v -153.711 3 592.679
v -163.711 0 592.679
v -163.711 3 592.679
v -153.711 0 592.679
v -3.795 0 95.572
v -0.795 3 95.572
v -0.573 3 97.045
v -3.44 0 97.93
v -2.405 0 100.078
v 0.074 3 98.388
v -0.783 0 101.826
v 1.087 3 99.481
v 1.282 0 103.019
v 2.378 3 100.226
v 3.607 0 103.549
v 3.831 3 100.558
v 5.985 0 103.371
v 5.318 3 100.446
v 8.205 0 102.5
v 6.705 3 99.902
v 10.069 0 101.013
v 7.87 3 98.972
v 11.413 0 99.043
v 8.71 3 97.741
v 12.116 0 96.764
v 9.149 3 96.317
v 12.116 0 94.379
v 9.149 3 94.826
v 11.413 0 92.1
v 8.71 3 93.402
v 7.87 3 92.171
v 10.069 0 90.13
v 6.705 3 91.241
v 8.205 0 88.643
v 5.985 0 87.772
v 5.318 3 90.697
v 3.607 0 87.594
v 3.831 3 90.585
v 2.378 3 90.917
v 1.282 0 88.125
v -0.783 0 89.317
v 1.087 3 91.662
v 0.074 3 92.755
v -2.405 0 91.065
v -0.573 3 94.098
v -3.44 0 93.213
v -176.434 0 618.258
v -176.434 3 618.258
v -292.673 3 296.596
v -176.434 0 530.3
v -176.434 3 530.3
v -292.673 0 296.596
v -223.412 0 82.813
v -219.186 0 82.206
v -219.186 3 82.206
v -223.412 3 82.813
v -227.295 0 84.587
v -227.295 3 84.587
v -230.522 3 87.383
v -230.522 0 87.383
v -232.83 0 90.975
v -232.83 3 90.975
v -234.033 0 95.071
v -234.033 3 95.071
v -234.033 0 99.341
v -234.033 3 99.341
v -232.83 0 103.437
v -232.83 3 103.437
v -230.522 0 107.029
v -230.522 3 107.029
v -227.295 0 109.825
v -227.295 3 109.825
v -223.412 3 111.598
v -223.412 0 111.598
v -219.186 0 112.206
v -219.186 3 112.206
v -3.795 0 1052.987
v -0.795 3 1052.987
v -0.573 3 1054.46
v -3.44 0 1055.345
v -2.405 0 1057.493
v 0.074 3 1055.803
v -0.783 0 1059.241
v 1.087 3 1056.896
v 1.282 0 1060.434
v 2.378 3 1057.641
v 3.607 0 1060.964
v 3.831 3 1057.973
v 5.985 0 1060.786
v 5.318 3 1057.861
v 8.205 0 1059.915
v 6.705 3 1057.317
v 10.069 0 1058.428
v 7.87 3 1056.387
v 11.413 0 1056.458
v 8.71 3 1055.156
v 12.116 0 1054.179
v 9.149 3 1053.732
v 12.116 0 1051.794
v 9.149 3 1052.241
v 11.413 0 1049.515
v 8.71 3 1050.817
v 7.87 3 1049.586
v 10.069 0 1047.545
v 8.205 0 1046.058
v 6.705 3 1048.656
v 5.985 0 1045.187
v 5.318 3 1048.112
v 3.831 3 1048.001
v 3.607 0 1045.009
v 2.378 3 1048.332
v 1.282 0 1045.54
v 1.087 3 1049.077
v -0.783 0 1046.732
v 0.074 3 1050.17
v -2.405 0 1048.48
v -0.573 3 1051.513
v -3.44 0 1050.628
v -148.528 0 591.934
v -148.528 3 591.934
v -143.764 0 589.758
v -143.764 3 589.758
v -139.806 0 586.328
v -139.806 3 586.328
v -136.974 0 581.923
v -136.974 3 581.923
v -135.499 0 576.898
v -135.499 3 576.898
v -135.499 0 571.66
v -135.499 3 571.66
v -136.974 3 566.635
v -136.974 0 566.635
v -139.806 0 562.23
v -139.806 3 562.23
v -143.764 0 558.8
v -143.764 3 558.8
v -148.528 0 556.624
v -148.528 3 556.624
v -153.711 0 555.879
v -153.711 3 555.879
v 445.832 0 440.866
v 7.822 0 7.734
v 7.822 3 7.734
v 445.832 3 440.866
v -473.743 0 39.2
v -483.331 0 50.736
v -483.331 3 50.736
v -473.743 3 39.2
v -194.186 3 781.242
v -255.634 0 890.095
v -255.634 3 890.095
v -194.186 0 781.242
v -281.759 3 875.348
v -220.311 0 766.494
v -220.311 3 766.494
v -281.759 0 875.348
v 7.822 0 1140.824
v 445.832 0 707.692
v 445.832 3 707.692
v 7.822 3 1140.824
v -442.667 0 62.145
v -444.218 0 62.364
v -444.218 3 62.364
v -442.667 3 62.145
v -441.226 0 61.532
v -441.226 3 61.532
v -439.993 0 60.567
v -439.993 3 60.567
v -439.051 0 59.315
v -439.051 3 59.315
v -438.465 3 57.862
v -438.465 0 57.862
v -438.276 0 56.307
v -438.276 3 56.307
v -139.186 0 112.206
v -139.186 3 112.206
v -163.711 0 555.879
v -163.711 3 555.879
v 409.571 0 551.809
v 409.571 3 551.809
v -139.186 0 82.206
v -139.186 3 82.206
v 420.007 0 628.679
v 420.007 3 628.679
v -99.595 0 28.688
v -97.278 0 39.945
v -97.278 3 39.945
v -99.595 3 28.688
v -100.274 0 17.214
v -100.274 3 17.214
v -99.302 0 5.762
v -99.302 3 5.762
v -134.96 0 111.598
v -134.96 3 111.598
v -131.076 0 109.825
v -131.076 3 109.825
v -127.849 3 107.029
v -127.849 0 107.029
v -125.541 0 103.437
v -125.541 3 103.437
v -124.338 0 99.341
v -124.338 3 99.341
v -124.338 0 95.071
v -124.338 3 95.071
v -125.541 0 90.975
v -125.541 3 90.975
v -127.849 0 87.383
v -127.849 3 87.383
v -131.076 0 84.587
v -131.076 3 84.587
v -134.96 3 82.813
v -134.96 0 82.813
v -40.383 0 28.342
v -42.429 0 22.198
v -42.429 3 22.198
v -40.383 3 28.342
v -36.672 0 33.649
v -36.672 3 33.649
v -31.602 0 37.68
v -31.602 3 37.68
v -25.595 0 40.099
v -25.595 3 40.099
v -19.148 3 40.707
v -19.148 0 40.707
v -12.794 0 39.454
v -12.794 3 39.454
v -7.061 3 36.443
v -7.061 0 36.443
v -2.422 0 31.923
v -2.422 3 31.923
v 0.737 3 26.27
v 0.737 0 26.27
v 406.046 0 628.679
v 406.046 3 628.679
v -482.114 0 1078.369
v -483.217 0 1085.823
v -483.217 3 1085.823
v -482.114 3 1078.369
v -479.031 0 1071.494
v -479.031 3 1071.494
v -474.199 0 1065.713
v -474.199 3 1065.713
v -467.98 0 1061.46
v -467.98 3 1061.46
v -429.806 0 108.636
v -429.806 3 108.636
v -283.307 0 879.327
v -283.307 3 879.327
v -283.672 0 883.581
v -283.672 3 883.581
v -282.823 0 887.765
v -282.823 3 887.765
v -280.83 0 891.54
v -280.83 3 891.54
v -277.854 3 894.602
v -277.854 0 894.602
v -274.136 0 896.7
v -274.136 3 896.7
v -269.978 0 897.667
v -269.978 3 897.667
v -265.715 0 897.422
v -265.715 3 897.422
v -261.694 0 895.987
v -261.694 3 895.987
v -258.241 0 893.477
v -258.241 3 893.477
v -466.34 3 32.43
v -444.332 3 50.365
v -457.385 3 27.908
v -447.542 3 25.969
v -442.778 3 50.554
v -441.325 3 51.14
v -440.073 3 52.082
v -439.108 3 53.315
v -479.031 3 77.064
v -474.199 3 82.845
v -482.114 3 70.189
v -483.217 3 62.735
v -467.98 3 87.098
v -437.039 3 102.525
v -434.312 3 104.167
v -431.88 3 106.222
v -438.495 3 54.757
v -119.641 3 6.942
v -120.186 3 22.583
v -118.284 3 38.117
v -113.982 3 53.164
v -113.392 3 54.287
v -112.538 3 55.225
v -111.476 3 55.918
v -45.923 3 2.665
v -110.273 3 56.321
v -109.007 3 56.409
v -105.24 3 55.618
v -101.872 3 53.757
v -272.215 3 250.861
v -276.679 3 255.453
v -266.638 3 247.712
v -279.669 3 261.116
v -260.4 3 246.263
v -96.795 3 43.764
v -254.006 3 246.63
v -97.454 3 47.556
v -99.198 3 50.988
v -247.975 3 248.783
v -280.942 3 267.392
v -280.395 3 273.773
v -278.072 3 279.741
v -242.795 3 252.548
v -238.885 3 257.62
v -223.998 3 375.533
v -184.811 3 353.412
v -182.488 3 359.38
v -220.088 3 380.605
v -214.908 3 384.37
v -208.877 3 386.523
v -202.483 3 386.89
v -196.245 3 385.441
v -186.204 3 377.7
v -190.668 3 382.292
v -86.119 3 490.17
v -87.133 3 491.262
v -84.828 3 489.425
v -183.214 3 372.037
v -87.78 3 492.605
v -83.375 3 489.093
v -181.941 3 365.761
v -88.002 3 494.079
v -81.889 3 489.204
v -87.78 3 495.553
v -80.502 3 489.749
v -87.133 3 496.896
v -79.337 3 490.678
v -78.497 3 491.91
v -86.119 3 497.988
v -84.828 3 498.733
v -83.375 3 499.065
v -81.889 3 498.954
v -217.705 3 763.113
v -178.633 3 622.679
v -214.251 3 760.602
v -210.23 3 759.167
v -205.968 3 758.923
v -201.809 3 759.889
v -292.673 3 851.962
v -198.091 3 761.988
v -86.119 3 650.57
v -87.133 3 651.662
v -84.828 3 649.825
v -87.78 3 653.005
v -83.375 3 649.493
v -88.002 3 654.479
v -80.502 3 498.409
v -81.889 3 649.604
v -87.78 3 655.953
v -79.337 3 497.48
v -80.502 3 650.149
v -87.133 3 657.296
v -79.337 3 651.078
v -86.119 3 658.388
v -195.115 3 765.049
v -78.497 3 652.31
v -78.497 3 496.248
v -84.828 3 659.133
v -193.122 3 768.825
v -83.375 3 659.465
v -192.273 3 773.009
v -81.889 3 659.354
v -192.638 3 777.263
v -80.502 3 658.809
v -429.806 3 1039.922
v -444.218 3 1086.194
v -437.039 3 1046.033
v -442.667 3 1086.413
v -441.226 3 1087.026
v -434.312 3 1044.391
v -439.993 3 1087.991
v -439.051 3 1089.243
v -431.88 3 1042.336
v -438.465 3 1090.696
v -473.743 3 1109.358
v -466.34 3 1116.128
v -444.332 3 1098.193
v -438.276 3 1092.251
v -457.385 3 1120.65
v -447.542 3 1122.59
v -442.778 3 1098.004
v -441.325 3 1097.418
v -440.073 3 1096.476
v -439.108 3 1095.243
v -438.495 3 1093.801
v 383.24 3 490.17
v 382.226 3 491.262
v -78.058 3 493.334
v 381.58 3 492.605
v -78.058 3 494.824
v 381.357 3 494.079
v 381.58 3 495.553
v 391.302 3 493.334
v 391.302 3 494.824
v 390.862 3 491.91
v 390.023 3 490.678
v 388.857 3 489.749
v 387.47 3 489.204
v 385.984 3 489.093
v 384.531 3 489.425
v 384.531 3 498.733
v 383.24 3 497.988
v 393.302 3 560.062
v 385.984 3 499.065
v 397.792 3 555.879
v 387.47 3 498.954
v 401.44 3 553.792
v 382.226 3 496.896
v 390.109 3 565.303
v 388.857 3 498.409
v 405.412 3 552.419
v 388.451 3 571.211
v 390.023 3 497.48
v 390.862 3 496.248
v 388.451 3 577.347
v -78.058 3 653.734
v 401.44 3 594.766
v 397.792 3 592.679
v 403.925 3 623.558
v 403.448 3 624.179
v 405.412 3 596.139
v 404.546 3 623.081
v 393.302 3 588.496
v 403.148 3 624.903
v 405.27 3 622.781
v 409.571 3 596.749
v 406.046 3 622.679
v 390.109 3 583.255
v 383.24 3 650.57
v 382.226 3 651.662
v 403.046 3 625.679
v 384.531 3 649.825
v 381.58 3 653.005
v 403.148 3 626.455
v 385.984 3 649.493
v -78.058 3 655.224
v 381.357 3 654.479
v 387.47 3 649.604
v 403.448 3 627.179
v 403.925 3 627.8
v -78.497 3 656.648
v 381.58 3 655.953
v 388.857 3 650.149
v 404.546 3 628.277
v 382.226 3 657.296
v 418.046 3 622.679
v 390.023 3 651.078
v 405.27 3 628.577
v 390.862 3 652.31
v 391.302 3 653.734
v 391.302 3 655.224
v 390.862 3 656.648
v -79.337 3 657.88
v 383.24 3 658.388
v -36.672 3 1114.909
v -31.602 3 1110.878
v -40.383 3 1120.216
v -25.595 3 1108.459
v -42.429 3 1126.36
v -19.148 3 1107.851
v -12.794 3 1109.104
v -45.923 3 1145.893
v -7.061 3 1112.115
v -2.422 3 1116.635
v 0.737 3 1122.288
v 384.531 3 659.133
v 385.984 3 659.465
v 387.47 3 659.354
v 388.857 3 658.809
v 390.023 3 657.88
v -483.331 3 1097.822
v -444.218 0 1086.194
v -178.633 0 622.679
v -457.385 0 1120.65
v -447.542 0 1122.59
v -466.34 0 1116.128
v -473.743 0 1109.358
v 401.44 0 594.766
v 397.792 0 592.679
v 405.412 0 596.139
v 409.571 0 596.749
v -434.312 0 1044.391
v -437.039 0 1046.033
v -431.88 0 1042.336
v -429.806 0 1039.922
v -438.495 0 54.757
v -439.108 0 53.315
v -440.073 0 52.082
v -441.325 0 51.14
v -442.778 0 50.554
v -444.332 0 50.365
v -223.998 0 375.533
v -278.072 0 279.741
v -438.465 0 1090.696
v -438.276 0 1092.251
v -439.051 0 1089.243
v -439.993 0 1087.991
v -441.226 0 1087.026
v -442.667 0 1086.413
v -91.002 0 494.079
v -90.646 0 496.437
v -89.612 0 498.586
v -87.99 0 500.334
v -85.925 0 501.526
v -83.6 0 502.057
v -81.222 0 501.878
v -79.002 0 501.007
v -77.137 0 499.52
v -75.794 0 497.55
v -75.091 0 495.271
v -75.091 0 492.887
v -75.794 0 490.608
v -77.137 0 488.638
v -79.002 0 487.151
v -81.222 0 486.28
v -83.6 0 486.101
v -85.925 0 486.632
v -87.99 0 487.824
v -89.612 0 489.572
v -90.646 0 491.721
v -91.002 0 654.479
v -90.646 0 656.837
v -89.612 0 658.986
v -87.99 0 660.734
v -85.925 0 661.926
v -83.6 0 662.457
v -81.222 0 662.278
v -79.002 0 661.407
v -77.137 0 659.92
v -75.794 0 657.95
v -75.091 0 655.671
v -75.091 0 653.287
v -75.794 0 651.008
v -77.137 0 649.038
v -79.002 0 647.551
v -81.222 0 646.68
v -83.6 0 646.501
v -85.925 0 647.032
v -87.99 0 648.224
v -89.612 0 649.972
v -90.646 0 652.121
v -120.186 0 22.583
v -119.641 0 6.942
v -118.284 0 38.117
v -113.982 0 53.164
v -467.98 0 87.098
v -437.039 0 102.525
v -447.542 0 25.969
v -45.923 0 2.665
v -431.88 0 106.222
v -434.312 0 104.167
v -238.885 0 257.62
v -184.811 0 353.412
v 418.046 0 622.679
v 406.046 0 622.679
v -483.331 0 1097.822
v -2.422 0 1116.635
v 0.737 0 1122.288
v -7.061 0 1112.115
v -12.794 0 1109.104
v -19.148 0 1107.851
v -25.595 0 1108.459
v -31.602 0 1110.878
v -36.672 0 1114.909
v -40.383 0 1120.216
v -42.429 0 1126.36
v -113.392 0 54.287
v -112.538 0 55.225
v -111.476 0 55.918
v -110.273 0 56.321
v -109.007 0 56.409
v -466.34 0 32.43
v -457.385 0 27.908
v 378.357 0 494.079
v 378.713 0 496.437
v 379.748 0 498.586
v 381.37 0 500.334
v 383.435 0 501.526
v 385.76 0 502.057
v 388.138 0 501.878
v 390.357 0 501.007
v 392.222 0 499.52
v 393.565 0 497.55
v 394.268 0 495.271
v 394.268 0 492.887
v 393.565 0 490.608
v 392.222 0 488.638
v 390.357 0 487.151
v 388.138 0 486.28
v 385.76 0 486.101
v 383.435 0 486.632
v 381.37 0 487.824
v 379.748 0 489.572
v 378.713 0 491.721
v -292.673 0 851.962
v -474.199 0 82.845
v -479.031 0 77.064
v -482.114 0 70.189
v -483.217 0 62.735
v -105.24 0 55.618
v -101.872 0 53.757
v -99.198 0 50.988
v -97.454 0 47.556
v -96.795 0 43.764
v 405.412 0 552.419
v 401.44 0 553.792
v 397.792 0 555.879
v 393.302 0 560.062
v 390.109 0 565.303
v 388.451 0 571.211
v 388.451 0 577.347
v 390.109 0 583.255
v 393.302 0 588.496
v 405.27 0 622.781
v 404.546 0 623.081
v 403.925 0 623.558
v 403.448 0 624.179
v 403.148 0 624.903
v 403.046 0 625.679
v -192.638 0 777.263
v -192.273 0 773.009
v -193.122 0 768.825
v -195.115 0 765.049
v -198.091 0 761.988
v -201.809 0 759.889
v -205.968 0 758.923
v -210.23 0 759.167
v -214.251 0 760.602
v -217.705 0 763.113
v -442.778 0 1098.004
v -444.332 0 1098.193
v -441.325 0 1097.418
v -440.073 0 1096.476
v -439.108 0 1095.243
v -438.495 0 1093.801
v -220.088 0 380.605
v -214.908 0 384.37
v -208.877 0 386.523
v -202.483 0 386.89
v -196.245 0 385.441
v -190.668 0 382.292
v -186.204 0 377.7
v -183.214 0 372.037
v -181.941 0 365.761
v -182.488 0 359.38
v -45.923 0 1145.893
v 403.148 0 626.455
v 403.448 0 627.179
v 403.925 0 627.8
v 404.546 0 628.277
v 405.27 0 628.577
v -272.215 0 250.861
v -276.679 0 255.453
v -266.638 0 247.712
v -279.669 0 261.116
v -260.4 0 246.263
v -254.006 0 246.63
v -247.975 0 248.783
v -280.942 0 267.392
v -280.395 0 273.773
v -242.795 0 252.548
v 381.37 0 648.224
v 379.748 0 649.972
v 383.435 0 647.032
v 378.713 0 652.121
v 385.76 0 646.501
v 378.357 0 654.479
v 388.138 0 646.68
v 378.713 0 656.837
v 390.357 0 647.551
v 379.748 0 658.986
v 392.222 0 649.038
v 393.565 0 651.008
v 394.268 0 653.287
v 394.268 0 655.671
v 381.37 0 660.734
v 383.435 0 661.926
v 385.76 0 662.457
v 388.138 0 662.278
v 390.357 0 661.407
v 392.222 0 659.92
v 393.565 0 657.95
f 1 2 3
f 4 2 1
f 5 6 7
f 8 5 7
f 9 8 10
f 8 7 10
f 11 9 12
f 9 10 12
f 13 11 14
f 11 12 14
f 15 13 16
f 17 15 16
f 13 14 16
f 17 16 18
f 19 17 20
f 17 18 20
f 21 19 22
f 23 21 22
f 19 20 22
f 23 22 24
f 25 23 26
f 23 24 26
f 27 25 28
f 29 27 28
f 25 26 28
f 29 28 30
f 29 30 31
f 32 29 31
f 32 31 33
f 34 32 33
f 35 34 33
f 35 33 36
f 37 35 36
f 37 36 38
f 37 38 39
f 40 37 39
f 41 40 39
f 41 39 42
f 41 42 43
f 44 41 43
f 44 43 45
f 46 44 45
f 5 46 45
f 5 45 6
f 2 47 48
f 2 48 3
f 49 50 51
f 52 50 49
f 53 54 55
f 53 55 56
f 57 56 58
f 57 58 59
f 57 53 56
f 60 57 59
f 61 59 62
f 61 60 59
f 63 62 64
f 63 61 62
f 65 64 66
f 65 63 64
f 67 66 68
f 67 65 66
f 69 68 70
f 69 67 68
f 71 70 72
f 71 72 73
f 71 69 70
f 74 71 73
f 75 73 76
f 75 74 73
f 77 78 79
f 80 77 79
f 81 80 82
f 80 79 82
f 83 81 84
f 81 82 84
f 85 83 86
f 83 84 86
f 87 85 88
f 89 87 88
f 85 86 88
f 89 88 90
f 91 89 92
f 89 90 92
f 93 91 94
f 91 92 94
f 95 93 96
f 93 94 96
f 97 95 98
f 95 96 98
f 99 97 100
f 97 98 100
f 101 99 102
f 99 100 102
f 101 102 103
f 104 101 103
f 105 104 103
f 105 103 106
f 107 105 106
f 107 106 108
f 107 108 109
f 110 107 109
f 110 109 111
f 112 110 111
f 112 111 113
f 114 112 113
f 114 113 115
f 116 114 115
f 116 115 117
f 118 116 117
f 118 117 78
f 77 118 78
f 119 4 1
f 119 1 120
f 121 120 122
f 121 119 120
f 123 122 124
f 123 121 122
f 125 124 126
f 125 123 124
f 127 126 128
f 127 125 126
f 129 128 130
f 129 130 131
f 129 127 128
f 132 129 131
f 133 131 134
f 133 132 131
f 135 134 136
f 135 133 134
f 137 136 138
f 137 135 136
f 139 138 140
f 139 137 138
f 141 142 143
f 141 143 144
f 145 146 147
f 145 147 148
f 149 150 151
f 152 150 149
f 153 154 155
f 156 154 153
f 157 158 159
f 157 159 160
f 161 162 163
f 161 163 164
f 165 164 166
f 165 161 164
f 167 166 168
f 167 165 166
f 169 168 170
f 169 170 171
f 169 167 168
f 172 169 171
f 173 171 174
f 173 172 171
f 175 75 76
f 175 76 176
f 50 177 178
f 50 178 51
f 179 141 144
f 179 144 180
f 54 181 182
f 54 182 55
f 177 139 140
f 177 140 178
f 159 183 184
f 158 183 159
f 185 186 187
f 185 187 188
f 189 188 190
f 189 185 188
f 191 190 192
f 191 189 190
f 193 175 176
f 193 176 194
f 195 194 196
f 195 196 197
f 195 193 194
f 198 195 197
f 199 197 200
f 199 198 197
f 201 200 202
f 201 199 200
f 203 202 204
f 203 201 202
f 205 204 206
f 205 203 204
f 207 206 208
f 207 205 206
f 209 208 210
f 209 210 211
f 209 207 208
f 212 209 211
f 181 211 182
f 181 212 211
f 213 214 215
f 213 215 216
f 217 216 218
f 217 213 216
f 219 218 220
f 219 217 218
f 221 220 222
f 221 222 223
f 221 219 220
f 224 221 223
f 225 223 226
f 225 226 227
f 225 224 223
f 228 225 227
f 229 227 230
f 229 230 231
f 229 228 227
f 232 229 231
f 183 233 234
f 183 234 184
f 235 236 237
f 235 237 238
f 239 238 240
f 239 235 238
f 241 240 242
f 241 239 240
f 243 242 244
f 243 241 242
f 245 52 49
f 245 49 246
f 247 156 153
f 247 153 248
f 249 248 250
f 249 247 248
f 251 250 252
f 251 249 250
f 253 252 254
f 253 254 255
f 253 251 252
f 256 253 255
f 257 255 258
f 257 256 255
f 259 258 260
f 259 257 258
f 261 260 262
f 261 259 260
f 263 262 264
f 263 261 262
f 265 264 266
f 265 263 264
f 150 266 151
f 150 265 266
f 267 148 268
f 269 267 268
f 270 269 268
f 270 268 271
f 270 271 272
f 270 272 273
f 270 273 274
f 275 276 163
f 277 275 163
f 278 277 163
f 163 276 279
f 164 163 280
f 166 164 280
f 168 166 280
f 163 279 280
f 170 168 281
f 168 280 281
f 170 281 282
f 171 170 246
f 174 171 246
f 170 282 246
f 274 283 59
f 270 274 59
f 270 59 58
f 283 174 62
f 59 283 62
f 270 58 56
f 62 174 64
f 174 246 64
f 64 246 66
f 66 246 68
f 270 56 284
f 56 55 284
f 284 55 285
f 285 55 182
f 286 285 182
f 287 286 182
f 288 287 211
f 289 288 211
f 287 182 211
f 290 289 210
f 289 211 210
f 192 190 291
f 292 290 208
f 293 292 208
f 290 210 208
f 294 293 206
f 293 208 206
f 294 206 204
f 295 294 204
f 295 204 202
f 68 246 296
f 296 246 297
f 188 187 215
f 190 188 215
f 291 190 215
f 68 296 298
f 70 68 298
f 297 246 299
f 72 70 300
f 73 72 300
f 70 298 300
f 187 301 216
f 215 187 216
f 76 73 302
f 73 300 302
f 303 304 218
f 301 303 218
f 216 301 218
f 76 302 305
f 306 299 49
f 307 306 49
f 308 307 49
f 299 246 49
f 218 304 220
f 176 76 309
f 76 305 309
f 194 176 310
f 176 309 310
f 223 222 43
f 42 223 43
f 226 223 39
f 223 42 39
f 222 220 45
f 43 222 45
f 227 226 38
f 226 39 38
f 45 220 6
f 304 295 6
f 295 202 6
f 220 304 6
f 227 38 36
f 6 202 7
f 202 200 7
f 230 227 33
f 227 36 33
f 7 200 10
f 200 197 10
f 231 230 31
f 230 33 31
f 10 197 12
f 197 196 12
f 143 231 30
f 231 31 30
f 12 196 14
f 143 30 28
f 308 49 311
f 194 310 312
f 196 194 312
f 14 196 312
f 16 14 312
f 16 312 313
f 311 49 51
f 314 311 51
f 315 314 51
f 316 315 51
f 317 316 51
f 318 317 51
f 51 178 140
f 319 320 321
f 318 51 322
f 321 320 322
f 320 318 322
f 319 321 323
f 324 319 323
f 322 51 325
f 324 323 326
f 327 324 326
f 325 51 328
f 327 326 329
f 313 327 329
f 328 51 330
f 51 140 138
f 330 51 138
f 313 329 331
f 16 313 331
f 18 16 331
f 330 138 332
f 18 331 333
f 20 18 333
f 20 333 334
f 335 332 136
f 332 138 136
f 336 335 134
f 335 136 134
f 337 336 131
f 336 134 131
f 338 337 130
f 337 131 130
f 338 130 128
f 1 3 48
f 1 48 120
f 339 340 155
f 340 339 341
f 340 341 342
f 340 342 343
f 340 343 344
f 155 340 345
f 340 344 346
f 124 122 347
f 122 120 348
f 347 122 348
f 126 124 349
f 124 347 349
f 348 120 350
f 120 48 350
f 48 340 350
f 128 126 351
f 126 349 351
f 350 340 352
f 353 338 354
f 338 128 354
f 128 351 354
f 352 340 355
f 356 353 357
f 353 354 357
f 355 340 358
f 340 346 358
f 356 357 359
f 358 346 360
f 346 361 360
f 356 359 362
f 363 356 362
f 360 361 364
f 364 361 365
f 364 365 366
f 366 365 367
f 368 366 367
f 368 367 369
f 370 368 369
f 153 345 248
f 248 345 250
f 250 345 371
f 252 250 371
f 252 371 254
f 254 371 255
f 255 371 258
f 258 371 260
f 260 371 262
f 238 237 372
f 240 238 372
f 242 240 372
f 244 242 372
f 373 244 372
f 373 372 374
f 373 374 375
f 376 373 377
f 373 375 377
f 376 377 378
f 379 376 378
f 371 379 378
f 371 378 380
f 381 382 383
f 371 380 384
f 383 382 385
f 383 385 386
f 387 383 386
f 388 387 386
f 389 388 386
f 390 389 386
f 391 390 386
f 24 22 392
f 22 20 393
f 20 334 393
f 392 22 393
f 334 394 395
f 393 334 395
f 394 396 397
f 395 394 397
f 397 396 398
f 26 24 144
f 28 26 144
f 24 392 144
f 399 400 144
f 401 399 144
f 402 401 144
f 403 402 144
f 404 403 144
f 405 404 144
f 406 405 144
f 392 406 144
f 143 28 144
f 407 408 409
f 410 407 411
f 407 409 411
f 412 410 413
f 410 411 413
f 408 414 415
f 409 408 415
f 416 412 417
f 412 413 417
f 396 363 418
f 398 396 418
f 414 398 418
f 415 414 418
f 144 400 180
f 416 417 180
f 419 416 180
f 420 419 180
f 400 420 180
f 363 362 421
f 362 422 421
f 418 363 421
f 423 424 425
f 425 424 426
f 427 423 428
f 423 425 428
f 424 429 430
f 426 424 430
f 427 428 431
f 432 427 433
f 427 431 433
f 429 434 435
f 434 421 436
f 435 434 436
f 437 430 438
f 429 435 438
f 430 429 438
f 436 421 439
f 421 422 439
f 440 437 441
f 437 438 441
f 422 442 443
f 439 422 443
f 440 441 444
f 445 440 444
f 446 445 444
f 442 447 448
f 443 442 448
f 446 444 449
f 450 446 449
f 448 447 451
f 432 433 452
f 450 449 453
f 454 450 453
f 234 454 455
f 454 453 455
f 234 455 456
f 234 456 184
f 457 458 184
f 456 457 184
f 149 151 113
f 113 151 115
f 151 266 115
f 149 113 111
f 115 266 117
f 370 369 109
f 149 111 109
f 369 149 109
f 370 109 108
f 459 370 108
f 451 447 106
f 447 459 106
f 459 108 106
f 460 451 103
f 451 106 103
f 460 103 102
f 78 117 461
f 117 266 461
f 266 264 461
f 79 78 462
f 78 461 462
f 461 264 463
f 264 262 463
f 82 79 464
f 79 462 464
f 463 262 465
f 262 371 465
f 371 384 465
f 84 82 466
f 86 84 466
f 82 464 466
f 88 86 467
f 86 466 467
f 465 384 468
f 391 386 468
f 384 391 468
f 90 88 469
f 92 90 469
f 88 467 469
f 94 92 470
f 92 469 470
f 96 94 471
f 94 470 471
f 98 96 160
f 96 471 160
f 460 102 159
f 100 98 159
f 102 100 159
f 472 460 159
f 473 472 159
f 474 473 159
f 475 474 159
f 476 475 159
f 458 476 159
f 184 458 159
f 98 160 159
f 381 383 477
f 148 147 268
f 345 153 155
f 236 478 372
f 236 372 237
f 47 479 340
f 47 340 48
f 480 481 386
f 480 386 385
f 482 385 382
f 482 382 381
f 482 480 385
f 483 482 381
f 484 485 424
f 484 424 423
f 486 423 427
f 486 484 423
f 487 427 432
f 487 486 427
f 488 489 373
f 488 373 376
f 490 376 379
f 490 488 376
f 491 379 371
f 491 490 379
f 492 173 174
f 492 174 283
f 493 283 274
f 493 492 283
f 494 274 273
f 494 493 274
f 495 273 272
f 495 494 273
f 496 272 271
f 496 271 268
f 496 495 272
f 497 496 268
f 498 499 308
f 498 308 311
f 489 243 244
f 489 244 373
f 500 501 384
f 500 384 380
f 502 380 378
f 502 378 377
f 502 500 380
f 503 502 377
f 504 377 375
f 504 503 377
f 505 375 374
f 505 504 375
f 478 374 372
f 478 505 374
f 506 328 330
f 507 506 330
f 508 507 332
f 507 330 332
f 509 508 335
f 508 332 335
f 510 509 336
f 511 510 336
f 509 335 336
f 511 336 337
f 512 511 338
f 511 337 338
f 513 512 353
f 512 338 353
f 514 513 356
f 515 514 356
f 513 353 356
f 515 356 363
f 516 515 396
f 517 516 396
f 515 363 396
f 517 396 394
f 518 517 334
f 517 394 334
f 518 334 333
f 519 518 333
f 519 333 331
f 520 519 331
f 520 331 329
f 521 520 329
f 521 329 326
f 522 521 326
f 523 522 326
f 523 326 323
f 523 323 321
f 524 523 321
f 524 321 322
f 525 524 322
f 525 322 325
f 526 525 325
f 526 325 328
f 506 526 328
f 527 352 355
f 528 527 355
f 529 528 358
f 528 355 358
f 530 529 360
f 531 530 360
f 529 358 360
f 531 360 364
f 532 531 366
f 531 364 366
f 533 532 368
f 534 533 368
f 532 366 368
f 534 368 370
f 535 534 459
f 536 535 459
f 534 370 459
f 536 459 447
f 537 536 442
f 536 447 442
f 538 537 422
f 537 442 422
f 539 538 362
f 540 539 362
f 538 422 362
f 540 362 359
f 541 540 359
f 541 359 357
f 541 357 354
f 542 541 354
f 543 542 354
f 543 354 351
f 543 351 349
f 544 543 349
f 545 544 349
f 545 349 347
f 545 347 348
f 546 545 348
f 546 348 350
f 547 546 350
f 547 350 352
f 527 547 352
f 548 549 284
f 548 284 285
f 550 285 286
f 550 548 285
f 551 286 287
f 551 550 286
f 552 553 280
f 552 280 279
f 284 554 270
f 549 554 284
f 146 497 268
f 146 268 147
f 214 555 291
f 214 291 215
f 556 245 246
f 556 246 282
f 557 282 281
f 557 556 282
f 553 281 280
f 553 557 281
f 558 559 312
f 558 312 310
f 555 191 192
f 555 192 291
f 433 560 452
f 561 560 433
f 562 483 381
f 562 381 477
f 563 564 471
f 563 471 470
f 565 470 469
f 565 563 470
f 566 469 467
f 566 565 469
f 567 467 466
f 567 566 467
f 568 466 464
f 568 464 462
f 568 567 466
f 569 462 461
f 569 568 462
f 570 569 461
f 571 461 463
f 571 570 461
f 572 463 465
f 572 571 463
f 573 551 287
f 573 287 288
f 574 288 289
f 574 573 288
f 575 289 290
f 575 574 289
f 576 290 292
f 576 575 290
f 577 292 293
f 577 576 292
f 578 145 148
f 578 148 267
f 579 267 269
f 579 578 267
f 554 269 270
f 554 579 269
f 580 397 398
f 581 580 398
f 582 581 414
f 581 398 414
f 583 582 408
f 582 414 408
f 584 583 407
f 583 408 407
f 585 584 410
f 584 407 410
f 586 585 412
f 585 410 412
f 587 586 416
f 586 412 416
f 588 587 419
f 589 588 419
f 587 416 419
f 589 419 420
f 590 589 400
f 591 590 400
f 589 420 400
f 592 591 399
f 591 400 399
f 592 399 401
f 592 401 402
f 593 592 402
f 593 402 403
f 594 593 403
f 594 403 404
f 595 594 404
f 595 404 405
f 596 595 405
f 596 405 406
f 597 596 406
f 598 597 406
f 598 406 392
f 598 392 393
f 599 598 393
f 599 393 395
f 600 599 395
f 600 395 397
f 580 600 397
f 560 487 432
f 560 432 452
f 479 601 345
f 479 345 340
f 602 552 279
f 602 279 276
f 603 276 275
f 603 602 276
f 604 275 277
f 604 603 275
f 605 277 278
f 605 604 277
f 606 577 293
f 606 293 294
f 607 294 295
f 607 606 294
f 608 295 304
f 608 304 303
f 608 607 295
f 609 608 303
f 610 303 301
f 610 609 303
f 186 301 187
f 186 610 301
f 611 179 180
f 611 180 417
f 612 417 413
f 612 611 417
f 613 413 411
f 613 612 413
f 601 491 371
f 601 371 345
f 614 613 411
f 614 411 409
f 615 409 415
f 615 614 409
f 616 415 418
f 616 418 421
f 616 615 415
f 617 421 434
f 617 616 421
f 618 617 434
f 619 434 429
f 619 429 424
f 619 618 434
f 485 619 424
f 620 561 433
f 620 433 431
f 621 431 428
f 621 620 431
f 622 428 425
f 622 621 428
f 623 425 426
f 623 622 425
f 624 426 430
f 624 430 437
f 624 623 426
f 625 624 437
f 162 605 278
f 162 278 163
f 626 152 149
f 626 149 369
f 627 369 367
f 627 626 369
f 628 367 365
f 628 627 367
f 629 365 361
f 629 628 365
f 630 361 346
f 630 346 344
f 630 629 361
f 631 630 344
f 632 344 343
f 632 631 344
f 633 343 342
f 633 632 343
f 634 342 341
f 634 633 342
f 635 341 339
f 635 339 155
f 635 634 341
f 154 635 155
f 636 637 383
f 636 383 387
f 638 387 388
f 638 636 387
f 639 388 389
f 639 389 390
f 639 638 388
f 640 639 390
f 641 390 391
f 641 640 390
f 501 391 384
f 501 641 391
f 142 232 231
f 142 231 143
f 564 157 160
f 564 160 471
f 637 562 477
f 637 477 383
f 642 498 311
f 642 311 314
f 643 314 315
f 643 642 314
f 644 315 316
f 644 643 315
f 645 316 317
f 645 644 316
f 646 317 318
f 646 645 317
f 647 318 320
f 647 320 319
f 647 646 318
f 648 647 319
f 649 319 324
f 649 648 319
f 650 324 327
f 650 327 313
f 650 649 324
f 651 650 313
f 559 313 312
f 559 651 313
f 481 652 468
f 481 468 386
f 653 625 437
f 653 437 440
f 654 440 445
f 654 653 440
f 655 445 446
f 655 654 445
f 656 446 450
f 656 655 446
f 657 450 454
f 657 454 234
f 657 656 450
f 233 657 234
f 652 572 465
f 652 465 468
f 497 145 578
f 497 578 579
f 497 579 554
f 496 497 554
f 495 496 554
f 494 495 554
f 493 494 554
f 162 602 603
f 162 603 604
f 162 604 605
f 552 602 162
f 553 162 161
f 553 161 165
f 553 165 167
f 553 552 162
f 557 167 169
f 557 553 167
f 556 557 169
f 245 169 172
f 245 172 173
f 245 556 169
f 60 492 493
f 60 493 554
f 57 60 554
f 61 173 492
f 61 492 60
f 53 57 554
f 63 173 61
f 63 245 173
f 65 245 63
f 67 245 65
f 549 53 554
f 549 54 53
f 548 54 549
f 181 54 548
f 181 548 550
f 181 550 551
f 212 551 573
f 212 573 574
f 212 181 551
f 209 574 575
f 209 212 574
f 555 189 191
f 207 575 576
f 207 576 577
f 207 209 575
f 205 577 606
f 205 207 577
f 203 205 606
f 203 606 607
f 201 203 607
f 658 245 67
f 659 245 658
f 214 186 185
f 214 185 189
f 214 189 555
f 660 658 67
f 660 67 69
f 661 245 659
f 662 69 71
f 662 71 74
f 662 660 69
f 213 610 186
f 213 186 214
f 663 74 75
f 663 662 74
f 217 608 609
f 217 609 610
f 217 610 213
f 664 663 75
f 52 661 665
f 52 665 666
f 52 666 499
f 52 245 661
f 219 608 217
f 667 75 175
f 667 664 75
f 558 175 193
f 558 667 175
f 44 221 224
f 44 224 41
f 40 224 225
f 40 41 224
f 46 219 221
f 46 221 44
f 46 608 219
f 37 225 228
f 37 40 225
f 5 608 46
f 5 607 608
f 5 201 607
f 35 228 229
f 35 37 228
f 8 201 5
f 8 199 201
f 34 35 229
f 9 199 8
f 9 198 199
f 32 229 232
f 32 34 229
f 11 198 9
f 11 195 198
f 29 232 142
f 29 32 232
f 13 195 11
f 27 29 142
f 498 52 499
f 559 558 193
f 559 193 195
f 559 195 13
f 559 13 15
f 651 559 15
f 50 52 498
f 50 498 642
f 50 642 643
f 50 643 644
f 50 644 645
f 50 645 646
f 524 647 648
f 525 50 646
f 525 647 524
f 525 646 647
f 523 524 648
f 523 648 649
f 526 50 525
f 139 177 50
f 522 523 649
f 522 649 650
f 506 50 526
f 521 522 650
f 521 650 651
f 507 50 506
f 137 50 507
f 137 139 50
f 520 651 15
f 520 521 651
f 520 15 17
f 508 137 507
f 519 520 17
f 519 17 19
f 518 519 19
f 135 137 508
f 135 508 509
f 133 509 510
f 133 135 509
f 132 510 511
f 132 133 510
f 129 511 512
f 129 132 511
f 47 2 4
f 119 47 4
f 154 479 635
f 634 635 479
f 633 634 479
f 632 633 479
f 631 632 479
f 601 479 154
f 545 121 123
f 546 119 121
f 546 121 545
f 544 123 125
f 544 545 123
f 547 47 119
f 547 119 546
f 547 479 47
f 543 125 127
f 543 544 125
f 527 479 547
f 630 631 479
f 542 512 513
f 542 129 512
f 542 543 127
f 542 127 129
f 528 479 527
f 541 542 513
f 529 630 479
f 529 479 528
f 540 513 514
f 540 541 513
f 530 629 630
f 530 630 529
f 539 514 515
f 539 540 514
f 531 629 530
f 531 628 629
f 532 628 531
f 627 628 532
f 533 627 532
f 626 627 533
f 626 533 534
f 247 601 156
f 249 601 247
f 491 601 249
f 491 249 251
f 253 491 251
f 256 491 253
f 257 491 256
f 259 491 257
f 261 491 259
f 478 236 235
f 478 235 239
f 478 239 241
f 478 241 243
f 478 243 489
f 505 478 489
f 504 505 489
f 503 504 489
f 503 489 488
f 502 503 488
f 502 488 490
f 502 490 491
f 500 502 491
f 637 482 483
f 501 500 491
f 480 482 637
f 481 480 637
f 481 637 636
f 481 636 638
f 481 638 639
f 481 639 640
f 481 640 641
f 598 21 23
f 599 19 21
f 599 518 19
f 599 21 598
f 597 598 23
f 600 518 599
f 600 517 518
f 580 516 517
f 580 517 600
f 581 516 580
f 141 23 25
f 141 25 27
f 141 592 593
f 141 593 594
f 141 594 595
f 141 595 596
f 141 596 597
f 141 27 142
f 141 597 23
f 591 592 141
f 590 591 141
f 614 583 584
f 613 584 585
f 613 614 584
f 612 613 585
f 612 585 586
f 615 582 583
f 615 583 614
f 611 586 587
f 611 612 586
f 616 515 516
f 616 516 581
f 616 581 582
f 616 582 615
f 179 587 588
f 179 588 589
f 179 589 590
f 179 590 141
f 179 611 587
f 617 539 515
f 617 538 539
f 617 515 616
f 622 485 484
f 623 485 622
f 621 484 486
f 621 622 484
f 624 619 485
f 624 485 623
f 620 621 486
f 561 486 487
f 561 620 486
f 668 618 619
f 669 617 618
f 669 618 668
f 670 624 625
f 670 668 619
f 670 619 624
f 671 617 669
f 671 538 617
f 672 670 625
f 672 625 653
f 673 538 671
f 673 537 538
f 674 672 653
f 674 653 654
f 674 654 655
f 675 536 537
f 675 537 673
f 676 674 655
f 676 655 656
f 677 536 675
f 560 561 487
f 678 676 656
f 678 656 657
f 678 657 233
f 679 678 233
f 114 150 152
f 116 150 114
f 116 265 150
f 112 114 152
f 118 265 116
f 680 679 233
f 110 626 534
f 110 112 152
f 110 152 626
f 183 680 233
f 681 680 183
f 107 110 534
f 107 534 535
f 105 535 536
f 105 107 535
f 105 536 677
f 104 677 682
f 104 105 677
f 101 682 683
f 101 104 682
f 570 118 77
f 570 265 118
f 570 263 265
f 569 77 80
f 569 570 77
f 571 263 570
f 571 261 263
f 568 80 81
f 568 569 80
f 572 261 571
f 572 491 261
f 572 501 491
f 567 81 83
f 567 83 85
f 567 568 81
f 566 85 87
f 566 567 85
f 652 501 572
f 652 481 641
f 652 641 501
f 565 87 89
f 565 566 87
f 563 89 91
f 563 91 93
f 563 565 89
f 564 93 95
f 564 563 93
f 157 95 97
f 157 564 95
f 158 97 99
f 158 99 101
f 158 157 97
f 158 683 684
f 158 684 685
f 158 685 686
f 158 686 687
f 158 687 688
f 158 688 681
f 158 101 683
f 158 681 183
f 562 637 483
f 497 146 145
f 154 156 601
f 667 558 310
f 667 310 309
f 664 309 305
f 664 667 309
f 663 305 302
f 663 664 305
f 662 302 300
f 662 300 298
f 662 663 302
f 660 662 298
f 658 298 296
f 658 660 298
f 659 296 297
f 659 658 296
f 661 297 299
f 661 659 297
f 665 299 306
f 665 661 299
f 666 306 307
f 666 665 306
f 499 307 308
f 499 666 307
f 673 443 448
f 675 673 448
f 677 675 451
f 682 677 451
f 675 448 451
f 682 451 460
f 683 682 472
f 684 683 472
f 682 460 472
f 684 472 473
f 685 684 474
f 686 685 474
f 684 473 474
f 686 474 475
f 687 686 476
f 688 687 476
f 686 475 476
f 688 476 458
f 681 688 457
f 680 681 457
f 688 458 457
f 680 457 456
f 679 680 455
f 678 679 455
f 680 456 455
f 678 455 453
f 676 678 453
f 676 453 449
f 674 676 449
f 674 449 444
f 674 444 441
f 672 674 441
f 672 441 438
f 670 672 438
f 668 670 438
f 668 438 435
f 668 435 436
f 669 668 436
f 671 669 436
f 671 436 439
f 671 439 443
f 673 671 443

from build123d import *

# Parameters (mm, degrees)
F1_DEPTH       = 3
F2_D           = 8
F2_CSINK_D     = 16
F2_CSINK_ANGLE = 90


with BuildPart() as f1:
    # F0 (on Front) → F1 (new body)
    with BuildSketch(Plane.XZ):
        with BuildLine():
            ThreePointArc((-42.428788, 22.197763), (-22.393428, 40.636528), (0.736568, 26.269656))
            Line((0.736568, 26.269656), (7.82161, 7.734496))
            Line((7.82161, 7.734496), (445.831745, 440.866256))
            Line((445.831745, 440.866256), (409.571118, 551.809463))
            ThreePointArc((409.571118, 551.809463), (403.393924, 553.012383), (397.791506, 555.879027))
            Line((397.791506, 555.879027), (-153.711431, 555.879027))
            Line((-153.711431, 555.879027), (-163.711431, 555.879027))
            Line((-163.711431, 555.879027), (-176.433934, 530.299822))
            Line((-176.433934, 530.299822), (-292.672837, 296.595913))
            Line((-292.672837, 296.595913), (-429.805557, 108.635613))
            ThreePointArc((-429.805557, 108.635613), (-433.055197, 105.145969), (-437.038546, 102.524765))
            Line((-437.038546, 102.524765), (-467.979575, 87.098137))
            ThreePointArc((-467.979575, 87.098137), (-479.031049, 77.063624), (-483.216559, 62.73505))
            Line((-483.216559, 62.73505), (-444.218322, 62.364245))
            ThreePointArc((-444.218322, 62.364245), (-439.992581, 60.566627), (-438.27564, 56.307469))
            ThreePointArc((-438.27564, 56.307469), (-440.073258, 52.081729), (-444.332415, 50.364787))
            Line((-444.332415, 50.364787), (-483.330653, 50.735592))
            Line((-483.330653, 50.735592), (-473.742625, 39.200006))
            ThreePointArc((-473.742625, 39.200006), (-462.016917, 29.862605), (-447.542263, 25.968544))
            Line((-447.542263, 25.968544), (-119.640526, 6.942116))
            ThreePointArc((-119.640526, 6.942116), (-119.539343, 30.38703), (-113.982147, 53.164032))
            ThreePointArc((-113.982147, 53.164032), (-112.028876, 55.605369), (-109.00742, 56.409233))
            Line((-109.00742, 56.409233), (-91.138541, 55.372396))
            ThreePointArc((-91.138541, 55.372396), (-94.609764, 47.818656), (-97.278364, 39.945477))
            ThreePointArc((-97.278364, 39.945477), (-100.140537, 22.963258), (-99.30184, 5.761968))
            Line((-99.30184, 5.761968), (-45.922757, 2.664658))
            Line((-45.922757, 2.664658), (-42.428788, 22.197763))
        make_face()
        with BuildLine():
            ThreePointArc((-219.185589, 82.205842), (-234.185589, 97.205842), (-219.185589, 112.205842))
            Line((-219.185589, 112.205842), (-139.185589, 112.205842))
            ThreePointArc((-139.185589, 112.205842), (-124.185589, 97.205842), (-139.185589, 82.205842))
            Line((-139.185589, 82.205842), (-219.185589, 82.205842))
        make_face(mode=Mode.SUBTRACT)
        with BuildLine():
            ThreePointArc((-238.884885, 257.620199), (-269.539195, 249.087128), (-278.072266, 279.741438))
            Line((-278.072266, 279.741438), (-223.998126, 375.532812))
            ThreePointArc((-223.998126, 375.532812), (-193.343817, 384.065883), (-184.810746, 353.411573))
            Line((-184.810746, 353.411573), (-238.884885, 257.620199))
        make_face(mode=Mode.SUBTRACT)
        with BuildLine():
            ThreePointArc((-109.00742, 56.409233), (-99.197738, 50.987949), (-97.278364, 39.945477))
            ThreePointArc((-97.278364, 39.945477), (-94.609764, 47.818656), (-91.138541, 55.372396))
            Line((-91.138541, 55.372396), (-109.00742, 56.409233))
        make_face()
        with BuildLine():
            Line((-153.711431, 555.879027), (397.791506, 555.879027))
            ThreePointArc((397.791506, 555.879027), (388.241023, 574.279027), (397.791506, 592.679027))
            Line((397.791506, 592.679027), (-153.711431, 592.679027))
            ThreePointArc((-153.711431, 592.679027), (-135.311431, 574.279027), (-153.711431, 555.879027))
        make_face()
        with BuildLine():
            Line((-153.711431, 592.679027), (397.791506, 592.679027))
            ThreePointArc((397.791506, 592.679027), (403.393924, 595.545671), (409.571118, 596.748591))
            Line((409.571118, 596.748591), (418.046209, 622.679027))
            Line((418.046209, 622.679027), (406.046209, 622.679027))
            ThreePointArc((406.046209, 622.679027), (403.924889, 623.557707), (403.046209, 625.679027))
            ThreePointArc((403.046209, 625.679027), (403.924889, 627.800347), (406.046209, 628.679027))
            Line((406.046209, 628.679027), (420.007247, 628.679027))
            Line((420.007247, 628.679027), (445.831745, 707.691799))
            Line((445.831745, 707.691799), (7.82161, 1140.823559))
            Line((7.82161, 1140.823559), (0.736568, 1122.288398))
            ThreePointArc((0.736568, 1122.288398), (-22.393428, 1107.921526), (-42.428788, 1126.360291))
            Line((-42.428788, 1126.360291), (-45.922757, 1145.893396))
            Line((-45.922757, 1145.893396), (-447.542263, 1122.58951))
            ThreePointArc((-447.542263, 1122.58951), (-462.016917, 1118.695449), (-473.742625, 1109.358048))
            Line((-473.742625, 1109.358048), (-483.330653, 1097.822462))
            Line((-483.330653, 1097.822462), (-444.332415, 1098.193267))
            ThreePointArc((-444.332415, 1098.193267), (-440.073258, 1096.476326), (-438.27564, 1092.250585))
            ThreePointArc((-438.27564, 1092.250585), (-439.992581, 1087.991428), (-444.218322, 1086.19381))
            Line((-444.218322, 1086.19381), (-483.216559, 1085.823005))
            ThreePointArc((-483.216559, 1085.823005), (-479.031049, 1071.494431), (-467.979575, 1061.459917))
            Line((-467.979575, 1061.459917), (-437.038546, 1046.033289))
            ThreePointArc((-437.038546, 1046.033289), (-433.055197, 1043.412085), (-429.805557, 1039.922441))
            Line((-429.805557, 1039.922441), (-292.672837, 851.962142))
            Line((-292.672837, 851.962142), (-178.632735, 622.679027))
            Line((-178.632735, 622.679027), (-176.433934, 618.258232))
            Line((-176.433934, 618.258232), (-163.711431, 592.679027))
            Line((-163.711431, 592.679027), (-153.711431, 592.679027))
        make_face()
        with BuildLine():
            ThreePointArc((-281.759139, 875.347847), (-276.070425, 895.784053), (-255.634219, 890.095339))
            Line((-255.634219, 890.095339), (-194.186333, 781.241505))
            ThreePointArc((-194.186333, 781.241505), (-199.875047, 760.805298), (-220.311253, 766.494012))
            Line((-220.311253, 766.494012), (-281.759139, 875.347847))
        make_face(mode=Mode.SUBTRACT)
    extrude(amount=-F1_DEPTH)

    # F2 (through all)
    with Locations(Plane.XZ):
        with Locations((386.357424, 494.079027), (-83.001788, 494.079027), (4.204936, 95.571513), (-83.001788, 654.479027), (4.204936, 1052.986541), (386.357424, 654.479027)):
            CounterSinkHole(F2_D / 2, F2_CSINK_D / 2, counter_sink_angle=F2_CSINK_ANGLE)


solid = f1.part
